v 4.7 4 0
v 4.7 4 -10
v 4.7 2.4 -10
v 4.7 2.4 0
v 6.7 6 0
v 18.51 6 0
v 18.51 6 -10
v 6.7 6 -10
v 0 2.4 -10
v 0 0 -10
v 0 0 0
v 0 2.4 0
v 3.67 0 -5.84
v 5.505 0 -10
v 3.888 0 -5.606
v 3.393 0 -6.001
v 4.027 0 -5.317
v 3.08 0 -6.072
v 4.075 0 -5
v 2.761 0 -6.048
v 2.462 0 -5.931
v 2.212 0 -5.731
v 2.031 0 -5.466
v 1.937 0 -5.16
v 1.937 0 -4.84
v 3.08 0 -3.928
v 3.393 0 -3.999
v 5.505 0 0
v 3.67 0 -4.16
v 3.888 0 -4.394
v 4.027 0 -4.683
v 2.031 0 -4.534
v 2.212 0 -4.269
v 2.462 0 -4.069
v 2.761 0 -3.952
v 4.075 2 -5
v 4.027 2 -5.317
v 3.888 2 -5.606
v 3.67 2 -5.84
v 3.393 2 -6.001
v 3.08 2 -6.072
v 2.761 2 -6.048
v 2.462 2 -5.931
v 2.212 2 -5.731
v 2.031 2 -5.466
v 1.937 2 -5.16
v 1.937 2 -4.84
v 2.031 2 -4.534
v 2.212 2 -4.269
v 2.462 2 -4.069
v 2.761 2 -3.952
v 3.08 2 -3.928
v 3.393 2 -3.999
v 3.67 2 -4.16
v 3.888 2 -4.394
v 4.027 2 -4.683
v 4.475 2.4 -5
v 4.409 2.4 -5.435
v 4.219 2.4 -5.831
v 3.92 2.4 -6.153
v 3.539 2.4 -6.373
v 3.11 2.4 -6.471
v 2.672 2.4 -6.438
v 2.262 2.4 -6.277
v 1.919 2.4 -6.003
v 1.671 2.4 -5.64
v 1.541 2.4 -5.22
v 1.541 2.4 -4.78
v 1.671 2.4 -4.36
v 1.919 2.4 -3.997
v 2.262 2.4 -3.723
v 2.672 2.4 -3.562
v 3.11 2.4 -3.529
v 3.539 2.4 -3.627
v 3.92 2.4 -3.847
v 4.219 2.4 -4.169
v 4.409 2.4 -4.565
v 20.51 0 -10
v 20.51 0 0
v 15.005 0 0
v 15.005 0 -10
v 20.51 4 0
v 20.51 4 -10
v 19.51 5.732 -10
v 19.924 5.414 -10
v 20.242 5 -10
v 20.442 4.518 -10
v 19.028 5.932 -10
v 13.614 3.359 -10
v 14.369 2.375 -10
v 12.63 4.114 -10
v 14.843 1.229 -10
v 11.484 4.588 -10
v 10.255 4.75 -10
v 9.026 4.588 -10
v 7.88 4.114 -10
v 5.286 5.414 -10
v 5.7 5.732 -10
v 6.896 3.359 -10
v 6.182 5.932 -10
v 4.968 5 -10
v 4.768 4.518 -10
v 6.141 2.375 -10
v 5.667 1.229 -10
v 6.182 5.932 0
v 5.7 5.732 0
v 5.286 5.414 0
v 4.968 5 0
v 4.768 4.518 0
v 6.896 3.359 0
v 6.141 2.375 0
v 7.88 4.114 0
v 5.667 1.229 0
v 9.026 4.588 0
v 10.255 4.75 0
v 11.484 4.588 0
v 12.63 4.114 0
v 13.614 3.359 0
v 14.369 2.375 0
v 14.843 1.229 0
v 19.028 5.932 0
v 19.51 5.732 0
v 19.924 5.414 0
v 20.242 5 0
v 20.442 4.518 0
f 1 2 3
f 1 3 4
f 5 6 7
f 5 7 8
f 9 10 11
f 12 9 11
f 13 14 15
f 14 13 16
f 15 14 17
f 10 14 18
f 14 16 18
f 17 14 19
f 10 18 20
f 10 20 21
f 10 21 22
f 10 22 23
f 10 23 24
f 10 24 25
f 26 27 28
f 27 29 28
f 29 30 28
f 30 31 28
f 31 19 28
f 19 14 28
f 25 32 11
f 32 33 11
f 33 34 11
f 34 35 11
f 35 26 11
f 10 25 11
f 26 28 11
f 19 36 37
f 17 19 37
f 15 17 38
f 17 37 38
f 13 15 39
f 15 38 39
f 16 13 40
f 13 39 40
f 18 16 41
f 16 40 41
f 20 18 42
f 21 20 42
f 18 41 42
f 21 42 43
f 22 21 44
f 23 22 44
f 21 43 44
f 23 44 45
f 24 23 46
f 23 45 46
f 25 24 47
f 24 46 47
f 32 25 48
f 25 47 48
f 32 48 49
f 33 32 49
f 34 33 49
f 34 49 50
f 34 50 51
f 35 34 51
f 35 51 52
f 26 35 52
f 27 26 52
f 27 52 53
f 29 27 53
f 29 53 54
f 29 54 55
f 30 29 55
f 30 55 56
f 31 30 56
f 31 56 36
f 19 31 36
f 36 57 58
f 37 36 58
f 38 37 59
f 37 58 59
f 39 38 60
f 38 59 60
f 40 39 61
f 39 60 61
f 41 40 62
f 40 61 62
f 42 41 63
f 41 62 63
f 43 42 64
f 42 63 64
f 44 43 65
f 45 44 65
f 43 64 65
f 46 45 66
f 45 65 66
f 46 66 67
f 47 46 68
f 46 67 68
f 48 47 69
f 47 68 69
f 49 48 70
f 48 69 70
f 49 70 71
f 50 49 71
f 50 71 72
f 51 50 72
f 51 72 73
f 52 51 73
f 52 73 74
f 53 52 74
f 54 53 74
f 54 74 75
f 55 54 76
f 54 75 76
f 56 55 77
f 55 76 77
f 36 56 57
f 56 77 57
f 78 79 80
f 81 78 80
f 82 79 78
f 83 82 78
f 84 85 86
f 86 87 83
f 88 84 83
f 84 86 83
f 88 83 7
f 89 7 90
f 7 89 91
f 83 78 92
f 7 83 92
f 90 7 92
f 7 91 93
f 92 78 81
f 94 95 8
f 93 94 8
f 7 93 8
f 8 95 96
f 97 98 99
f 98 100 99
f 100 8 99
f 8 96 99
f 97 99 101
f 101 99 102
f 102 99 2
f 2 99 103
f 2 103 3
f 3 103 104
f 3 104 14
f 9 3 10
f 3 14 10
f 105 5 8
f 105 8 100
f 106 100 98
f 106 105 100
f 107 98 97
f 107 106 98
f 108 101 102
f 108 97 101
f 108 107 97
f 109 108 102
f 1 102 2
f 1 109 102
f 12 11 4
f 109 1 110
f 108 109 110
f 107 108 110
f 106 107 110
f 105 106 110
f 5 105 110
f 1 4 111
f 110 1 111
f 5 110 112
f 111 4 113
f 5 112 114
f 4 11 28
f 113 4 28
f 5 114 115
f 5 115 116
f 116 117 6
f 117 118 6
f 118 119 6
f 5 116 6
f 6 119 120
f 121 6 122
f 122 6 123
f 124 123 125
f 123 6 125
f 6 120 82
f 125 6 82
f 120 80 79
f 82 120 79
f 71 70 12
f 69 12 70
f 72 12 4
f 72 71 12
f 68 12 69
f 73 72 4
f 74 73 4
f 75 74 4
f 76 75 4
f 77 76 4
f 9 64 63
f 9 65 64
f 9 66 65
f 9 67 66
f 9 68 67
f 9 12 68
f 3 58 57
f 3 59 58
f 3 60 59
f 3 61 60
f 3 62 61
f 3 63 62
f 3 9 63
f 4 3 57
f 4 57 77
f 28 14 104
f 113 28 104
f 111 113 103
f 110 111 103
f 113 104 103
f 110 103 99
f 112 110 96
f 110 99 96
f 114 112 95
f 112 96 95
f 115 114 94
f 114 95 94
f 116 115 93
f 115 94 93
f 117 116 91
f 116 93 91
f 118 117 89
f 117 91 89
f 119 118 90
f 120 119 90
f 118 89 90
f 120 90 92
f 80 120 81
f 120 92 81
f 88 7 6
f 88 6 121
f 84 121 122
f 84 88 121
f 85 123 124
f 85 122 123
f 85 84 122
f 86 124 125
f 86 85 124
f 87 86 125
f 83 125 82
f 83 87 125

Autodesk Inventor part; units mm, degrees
ref_plane "YZ Plane" through (0, 0, 0) normal (1, 0, 0) x (0, 1, 0)
ref_plane "XZ Plane" through (0, 0, 0) normal (0, 1, 0) x (-1, 0, 0)
ref_plane "XY Plane" through (0, 0, 0) normal (0, 0, 1) x (1, 0, 0)
sketch "Sketch1" plane through (0, 0, 0) normal (0, 1, 0) x (-1, 0, 0)
  line L0 (0, 0) -> (-20.51, 0)
  line L1 (-20.51, 0) -> (-20.51, -10)
  line L2 (-20.51, -10) -> (0, -10)
  line L3 (0, -10) -> (0, 0)
  dimension "d0" = 20.51
  dimension "d1" = 10
extrude "Extrusion1" add sketch "Sketch1" along normal blind 6
sketch "Sketch3" plane through (20.51, 0, -10) normal (0, 0, -1) x (-1, 0, 0)
  line L0 (0, 0) -> (20.51, 0) projected
  circle A0 centre (10.255, 0) radius 4.75
  point P0 (15.005, 0)
  point P1 (5.505, 0)
  dimension "d4" = 9.5
extrude "Extrusion2" cut sketch "Sketch3" against normal through all contours A0 L0 picked at (11.657, 0.7358)
sketch "Sketch7" plane through (0, 6, 0) normal (0, 1, 0) x (1, 0, 0)
  line L0 (0, 0) -> (20.51, 0) projected
  line L1 (20.51, 10) -> (0, 10) projected
  line L2 (4.7, 0) -> (0, 0)
  line L3 (0, 0) -> (0, 10)
  line L4 (0, 10) -> (4.7, 10)
  line L5 (4.7, 10) -> (4.7, 0)
extrude "Extrusion3" cut sketch "Sketch7" against normal blind 3.6
sketch "Sketch8" plane through (0, 2.4, 0) normal (0, 1, 0) x (1, 0, 0)
  circle A0 centre (3, 5) radius 1.075
  point P0 (0, 0)
  dimension "d9" = 2.15
extrude "Extrusion4" cut sketch "Sketch8" against normal through all
chamfer "Chamfer1" distance 0.4 angle 45 1 edges at (1.925, 2.4, -5)
fillet "Fillet1" radius 2 2 edges at (4.7, 6, -5) (20.51, 6, -5)
properties part number "dg_clamp"
